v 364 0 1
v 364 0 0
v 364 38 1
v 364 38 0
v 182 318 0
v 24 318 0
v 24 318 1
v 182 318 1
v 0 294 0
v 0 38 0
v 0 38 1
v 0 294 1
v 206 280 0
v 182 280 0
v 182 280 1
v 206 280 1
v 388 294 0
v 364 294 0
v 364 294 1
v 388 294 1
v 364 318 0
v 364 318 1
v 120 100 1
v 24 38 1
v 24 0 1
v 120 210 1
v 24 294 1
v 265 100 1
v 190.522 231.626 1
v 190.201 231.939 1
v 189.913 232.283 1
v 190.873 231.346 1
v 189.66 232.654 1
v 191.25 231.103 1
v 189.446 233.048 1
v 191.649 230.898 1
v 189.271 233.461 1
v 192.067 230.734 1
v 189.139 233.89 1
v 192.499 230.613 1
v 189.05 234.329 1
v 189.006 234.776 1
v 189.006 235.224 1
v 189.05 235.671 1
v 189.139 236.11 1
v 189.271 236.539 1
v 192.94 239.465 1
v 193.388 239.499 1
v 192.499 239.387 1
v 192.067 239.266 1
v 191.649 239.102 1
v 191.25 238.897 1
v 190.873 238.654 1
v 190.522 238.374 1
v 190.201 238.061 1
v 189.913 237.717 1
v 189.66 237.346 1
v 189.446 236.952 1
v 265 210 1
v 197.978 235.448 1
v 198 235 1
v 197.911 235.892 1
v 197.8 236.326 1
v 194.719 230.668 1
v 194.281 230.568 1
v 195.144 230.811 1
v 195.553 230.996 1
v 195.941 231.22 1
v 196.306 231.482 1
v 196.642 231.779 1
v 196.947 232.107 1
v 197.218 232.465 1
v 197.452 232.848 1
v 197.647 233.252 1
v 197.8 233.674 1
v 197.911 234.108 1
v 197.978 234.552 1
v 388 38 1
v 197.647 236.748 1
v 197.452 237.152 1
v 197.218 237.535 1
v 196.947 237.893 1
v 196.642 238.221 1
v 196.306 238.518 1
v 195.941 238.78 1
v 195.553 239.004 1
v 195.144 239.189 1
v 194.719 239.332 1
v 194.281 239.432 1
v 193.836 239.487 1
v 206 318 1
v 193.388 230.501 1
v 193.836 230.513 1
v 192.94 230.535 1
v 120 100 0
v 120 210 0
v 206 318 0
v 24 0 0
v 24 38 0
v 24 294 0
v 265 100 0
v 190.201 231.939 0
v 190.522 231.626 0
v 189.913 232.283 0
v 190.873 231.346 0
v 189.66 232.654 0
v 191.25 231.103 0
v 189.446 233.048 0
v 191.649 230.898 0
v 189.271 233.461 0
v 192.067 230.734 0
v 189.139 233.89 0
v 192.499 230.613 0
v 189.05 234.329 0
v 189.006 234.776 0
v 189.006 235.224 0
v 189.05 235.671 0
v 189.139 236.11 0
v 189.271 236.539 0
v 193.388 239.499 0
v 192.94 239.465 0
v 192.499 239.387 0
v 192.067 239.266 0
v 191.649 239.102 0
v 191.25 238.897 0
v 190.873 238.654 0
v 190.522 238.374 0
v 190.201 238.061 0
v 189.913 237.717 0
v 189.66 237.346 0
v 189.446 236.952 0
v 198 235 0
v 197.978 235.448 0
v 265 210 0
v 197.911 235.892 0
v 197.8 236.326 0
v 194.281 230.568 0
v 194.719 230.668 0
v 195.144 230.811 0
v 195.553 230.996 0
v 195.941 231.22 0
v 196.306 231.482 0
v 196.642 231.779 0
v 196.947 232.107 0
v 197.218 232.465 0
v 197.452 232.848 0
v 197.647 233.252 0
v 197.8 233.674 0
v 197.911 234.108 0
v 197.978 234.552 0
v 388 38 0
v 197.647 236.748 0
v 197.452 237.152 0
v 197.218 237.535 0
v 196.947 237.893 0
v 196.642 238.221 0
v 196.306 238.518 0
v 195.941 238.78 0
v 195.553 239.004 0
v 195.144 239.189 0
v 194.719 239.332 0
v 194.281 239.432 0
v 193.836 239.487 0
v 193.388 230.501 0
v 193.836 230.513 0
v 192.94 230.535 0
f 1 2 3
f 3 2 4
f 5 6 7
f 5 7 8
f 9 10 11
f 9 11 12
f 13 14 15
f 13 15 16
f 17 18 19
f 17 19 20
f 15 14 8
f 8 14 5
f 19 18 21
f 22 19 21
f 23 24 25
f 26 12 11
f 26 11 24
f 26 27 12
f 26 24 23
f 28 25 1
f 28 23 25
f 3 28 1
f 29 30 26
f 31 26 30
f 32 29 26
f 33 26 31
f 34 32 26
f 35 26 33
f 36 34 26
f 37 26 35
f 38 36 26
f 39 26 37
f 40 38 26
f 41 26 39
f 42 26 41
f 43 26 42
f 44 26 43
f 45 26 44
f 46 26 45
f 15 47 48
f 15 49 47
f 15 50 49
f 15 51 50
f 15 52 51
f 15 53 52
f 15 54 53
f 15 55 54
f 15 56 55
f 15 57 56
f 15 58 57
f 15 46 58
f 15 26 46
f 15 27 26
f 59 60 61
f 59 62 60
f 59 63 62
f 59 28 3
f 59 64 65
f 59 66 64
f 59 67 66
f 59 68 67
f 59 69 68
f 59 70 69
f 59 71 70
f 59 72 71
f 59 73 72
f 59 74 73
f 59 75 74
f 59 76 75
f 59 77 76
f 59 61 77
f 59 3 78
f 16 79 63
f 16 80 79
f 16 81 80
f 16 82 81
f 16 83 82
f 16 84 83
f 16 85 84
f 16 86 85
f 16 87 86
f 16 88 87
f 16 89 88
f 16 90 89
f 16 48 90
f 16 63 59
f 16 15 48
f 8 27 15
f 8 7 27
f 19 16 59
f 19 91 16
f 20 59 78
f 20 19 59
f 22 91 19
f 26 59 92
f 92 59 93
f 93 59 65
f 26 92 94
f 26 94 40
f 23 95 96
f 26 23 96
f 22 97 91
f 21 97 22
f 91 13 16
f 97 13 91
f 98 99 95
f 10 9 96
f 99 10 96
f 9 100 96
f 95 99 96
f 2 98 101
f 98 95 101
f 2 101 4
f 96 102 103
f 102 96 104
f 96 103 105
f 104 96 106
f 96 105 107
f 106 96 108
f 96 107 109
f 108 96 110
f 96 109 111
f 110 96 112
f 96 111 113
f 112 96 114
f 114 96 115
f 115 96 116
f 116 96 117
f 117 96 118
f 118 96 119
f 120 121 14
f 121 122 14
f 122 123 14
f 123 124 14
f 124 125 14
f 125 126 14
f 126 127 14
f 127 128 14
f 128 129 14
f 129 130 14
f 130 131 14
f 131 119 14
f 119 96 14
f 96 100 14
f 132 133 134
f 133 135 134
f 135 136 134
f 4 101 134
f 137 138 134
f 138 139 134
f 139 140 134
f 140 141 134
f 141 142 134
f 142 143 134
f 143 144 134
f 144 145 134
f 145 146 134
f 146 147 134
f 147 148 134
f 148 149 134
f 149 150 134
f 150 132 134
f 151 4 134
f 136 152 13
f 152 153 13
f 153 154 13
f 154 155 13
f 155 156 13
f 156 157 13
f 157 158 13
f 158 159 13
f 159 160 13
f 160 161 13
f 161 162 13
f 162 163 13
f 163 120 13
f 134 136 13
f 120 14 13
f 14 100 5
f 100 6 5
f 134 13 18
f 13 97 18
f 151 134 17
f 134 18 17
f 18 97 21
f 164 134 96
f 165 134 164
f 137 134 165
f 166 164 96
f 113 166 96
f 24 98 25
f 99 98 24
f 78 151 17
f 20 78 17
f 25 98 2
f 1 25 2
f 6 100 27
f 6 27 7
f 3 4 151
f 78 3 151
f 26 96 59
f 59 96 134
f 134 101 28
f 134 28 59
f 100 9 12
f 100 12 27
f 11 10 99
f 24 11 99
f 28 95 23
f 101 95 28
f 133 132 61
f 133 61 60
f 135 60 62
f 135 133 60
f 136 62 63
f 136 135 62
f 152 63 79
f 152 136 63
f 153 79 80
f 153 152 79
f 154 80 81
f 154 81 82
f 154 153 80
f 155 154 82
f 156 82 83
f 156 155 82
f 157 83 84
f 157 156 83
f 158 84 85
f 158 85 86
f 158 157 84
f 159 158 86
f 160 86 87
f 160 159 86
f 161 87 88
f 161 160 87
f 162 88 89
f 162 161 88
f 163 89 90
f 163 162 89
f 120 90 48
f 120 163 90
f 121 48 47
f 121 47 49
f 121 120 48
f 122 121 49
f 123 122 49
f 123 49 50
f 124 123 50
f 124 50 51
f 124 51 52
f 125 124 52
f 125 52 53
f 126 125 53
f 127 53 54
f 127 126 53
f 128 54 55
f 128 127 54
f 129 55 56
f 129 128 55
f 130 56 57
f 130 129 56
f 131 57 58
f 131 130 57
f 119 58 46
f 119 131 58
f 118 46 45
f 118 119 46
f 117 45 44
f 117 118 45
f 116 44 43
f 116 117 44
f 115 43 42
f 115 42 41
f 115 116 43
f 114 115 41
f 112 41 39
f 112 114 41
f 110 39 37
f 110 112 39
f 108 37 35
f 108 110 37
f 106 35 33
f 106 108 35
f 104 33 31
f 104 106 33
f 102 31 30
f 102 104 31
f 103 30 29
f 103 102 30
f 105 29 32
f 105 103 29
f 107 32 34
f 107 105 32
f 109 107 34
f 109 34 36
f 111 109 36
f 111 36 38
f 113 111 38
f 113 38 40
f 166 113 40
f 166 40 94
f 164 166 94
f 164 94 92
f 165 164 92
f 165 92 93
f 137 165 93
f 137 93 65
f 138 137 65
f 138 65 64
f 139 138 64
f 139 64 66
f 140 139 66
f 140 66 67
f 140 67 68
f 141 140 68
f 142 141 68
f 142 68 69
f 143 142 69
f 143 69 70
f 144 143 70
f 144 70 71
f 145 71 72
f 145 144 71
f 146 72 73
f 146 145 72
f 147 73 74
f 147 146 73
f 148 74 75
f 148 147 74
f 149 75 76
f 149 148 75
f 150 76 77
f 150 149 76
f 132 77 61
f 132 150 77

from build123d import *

# Parameters (mm, degrees)
BOX005_W       = 145
BOX005_H       = 110
BOX005_DEPTH   = 1
BOX006_W       = 24
BOX006_H       = 38
BOX006_DEPTH   = 1
CYLINDER_R     = 4.5
CYLINDER_DEPTH = 1
BOX002_W       = 24
BOX002_H       = 38
BOX002_DEPTH   = 1
BOX003_W       = 24
BOX003_H       = 24
BOX003_DEPTH   = 1
BOX004_W       = 24
BOX004_H       = 24
BOX004_DEPTH   = 1
BOX001_W       = 24
BOX001_H       = 38
BOX001_DEPTH   = 1
BOX_W          = 388
BOX_H          = 318
BOX_DEPTH      = 1


with BuildPart() as hueco_central:
    # Box005 → Box005 (new body)
    with BuildSketch(Plane(origin=(120, 100, 0), x_dir=(1, 0, 0), z_dir=(0, 0, 1))):
        with Locations((72.5, 55)):
            Rectangle(BOX005_W, BOX005_H)
    extrude(amount=BOX005_DEPTH)


with BuildPart() as cubo005:
    # Box006 → Box006 (new body)
    with BuildSketch(Plane(origin=(182, 280, 0), x_dir=(1, 0, 0), z_dir=(0, 0, 1))):
        with Locations((12, 19)):
            Rectangle(BOX006_W, BOX006_H)
    extrude(amount=BOX006_DEPTH)


with BuildPart() as cilindro:
    # Cylinder → Cylinder (new body)
    with BuildSketch(Plane(origin=(193.5, 235, 0), x_dir=(1, 0, 0), z_dir=(0, 0, 1))):
        Circle(CYLINDER_R)
    extrude(amount=CYLINDER_DEPTH)


with BuildPart() as cubo002:
    # Box002 → Box002 (new body)
    with BuildSketch(Plane(origin=(364, 0, 0), x_dir=(1, 0, 0), z_dir=(0, 0, 1))):
        with Locations((12, 19)):
            Rectangle(BOX002_W, BOX002_H)
    extrude(amount=BOX002_DEPTH)


with BuildPart() as cubo003:
    # Box003 → Box003 (new body)
    with BuildSketch(Plane(origin=(0, 294, 0), x_dir=(1, 0, 0), z_dir=(0, 0, 1))):
        with Locations((12, 12)):
            Rectangle(BOX003_W, BOX003_H)
    extrude(amount=BOX003_DEPTH)


with BuildPart() as cubo004:
    # Box004 → Box004 (new body)
    with BuildSketch(Plane(origin=(364, 294, 0), x_dir=(1, 0, 0), z_dir=(0, 0, 1))):
        with Locations((12, 12)):
            Rectangle(BOX004_W, BOX004_H)
    extrude(amount=BOX004_DEPTH)


with BuildPart() as cortes:
    # Box001 → Box001 (new body)
    with BuildSketch(Plane.XY):
        with Locations((12, 19)):
            Rectangle(BOX001_W, BOX001_H)
    extrude(amount=BOX001_DEPTH)

    # Fusion: union Cubo002, Cubo003, Cubo004
    add(cubo002.part)
    add(cubo003.part)
    add(cubo004.part)

    # Fusion001: union hueco central, Cubo005, Cilindro
    add(hueco_central.part)
    add(cubo005.part)
    add(cilindro.part)


with BuildPart() as cut:
    # Box → Box (new body)
    with BuildSketch(Plane.XY):
        with Locations((194, 159)):
            Rectangle(BOX_W, BOX_H)
    extrude(amount=BOX_DEPTH)

    # Cut: cut cortes
    add(cortes.part, mode=Mode.SUBTRACT)


solid = cut.part
